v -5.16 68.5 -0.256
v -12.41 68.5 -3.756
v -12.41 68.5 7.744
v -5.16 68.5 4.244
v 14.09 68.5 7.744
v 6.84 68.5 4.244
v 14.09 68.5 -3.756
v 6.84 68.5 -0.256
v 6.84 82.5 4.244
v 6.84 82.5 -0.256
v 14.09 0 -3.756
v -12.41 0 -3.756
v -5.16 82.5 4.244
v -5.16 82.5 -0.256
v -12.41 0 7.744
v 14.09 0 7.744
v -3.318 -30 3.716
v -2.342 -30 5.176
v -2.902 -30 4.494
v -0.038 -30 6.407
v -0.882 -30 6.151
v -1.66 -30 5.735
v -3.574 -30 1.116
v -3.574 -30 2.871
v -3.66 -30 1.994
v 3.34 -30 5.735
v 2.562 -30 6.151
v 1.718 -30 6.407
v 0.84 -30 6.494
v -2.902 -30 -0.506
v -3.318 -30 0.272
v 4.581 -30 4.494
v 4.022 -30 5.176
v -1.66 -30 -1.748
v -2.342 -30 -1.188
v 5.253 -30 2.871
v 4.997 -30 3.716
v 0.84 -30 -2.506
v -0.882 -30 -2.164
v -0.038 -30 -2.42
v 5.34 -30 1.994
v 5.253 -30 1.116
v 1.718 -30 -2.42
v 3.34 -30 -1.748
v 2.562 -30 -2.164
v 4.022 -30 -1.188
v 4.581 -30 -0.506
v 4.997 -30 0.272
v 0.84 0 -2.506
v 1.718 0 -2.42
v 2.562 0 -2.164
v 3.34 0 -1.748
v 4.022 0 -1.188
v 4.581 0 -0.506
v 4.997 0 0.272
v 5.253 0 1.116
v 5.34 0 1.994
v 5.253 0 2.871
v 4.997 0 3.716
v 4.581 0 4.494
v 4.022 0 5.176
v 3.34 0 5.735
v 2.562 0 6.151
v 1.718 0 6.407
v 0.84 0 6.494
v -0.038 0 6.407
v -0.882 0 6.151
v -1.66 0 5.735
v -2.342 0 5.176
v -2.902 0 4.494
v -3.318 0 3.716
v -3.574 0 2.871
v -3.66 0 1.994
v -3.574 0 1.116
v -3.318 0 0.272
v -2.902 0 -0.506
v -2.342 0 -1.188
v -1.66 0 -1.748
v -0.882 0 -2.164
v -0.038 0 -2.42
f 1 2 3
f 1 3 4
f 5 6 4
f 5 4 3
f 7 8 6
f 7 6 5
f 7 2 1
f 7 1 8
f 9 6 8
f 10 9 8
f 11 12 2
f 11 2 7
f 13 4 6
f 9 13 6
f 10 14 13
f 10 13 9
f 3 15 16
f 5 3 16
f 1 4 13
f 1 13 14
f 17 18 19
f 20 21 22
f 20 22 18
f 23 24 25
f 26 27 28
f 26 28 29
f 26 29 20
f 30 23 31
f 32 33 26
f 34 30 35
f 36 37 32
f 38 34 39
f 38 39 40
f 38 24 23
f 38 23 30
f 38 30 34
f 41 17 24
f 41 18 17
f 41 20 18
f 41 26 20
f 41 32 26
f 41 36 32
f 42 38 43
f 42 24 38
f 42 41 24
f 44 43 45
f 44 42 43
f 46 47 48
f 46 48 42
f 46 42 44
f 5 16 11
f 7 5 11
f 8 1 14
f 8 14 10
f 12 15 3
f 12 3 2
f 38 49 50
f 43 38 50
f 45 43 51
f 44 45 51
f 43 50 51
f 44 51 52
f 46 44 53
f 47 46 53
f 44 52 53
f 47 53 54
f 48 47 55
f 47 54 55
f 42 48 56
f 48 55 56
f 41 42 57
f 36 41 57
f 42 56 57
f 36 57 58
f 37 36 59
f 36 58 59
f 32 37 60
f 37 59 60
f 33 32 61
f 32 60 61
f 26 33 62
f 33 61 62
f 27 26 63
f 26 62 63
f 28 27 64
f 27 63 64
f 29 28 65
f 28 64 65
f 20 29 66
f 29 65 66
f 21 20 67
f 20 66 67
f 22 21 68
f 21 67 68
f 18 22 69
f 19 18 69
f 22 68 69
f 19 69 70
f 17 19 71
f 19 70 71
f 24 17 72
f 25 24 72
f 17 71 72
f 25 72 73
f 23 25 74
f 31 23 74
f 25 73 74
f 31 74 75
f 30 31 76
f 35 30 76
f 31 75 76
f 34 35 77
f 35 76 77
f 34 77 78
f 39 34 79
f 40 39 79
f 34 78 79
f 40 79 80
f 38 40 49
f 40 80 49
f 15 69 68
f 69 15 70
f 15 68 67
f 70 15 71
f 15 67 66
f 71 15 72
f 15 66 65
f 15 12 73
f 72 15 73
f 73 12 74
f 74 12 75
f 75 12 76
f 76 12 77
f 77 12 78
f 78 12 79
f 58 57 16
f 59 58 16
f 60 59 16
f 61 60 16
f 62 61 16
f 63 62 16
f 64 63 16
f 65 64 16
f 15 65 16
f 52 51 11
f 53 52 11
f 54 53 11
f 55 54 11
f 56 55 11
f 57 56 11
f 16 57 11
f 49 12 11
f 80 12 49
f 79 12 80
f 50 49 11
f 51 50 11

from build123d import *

# Parameters (mm, degrees)
SKETCH_1_W      = 26.5
SKETCH_1_H      = 11.5
EXTRUDE_1_DEPTH = 68.5
SKETCH_2_W      = 12
SKETCH_2_H      = 4.5
EXTRUDE_2_DEPTH = 14
SKETCH_3_R      = 4.5
EXTRUDE_3_DEPTH = 30


with BuildPart() as part:
    # 草图1 → 凸台-拉伸1 (new body)
    with BuildSketch(Plane(origin=(0, 0, 0), x_dir=(1, 0, 0), z_dir=(0, 1, 0))):
        with Locations((0.83974359, -1.993589744)):
            Rectangle(SKETCH_1_W, SKETCH_1_H)
    extrude(amount=EXTRUDE_1_DEPTH)

    # 草图2 → 凸台-拉伸2 (add)
    with BuildSketch(Plane(origin=(0, 68.5, 0), x_dir=(1, 0, 0), z_dir=(0, 1, 0))):
        with Locations((0.83974359, -1.993589744)):
            Rectangle(SKETCH_2_W, SKETCH_2_H)
    extrude(amount=EXTRUDE_2_DEPTH)

    # 草图3 → 凸台-拉伸3 (add)
    with BuildSketch(Plane.XZ):
        with Locations(Location((0.83974359, 1.993589744, 0), (0, 0, 270))):
            Circle(SKETCH_3_R)
    extrude(amount=EXTRUDE_3_DEPTH)


solid = part.part
